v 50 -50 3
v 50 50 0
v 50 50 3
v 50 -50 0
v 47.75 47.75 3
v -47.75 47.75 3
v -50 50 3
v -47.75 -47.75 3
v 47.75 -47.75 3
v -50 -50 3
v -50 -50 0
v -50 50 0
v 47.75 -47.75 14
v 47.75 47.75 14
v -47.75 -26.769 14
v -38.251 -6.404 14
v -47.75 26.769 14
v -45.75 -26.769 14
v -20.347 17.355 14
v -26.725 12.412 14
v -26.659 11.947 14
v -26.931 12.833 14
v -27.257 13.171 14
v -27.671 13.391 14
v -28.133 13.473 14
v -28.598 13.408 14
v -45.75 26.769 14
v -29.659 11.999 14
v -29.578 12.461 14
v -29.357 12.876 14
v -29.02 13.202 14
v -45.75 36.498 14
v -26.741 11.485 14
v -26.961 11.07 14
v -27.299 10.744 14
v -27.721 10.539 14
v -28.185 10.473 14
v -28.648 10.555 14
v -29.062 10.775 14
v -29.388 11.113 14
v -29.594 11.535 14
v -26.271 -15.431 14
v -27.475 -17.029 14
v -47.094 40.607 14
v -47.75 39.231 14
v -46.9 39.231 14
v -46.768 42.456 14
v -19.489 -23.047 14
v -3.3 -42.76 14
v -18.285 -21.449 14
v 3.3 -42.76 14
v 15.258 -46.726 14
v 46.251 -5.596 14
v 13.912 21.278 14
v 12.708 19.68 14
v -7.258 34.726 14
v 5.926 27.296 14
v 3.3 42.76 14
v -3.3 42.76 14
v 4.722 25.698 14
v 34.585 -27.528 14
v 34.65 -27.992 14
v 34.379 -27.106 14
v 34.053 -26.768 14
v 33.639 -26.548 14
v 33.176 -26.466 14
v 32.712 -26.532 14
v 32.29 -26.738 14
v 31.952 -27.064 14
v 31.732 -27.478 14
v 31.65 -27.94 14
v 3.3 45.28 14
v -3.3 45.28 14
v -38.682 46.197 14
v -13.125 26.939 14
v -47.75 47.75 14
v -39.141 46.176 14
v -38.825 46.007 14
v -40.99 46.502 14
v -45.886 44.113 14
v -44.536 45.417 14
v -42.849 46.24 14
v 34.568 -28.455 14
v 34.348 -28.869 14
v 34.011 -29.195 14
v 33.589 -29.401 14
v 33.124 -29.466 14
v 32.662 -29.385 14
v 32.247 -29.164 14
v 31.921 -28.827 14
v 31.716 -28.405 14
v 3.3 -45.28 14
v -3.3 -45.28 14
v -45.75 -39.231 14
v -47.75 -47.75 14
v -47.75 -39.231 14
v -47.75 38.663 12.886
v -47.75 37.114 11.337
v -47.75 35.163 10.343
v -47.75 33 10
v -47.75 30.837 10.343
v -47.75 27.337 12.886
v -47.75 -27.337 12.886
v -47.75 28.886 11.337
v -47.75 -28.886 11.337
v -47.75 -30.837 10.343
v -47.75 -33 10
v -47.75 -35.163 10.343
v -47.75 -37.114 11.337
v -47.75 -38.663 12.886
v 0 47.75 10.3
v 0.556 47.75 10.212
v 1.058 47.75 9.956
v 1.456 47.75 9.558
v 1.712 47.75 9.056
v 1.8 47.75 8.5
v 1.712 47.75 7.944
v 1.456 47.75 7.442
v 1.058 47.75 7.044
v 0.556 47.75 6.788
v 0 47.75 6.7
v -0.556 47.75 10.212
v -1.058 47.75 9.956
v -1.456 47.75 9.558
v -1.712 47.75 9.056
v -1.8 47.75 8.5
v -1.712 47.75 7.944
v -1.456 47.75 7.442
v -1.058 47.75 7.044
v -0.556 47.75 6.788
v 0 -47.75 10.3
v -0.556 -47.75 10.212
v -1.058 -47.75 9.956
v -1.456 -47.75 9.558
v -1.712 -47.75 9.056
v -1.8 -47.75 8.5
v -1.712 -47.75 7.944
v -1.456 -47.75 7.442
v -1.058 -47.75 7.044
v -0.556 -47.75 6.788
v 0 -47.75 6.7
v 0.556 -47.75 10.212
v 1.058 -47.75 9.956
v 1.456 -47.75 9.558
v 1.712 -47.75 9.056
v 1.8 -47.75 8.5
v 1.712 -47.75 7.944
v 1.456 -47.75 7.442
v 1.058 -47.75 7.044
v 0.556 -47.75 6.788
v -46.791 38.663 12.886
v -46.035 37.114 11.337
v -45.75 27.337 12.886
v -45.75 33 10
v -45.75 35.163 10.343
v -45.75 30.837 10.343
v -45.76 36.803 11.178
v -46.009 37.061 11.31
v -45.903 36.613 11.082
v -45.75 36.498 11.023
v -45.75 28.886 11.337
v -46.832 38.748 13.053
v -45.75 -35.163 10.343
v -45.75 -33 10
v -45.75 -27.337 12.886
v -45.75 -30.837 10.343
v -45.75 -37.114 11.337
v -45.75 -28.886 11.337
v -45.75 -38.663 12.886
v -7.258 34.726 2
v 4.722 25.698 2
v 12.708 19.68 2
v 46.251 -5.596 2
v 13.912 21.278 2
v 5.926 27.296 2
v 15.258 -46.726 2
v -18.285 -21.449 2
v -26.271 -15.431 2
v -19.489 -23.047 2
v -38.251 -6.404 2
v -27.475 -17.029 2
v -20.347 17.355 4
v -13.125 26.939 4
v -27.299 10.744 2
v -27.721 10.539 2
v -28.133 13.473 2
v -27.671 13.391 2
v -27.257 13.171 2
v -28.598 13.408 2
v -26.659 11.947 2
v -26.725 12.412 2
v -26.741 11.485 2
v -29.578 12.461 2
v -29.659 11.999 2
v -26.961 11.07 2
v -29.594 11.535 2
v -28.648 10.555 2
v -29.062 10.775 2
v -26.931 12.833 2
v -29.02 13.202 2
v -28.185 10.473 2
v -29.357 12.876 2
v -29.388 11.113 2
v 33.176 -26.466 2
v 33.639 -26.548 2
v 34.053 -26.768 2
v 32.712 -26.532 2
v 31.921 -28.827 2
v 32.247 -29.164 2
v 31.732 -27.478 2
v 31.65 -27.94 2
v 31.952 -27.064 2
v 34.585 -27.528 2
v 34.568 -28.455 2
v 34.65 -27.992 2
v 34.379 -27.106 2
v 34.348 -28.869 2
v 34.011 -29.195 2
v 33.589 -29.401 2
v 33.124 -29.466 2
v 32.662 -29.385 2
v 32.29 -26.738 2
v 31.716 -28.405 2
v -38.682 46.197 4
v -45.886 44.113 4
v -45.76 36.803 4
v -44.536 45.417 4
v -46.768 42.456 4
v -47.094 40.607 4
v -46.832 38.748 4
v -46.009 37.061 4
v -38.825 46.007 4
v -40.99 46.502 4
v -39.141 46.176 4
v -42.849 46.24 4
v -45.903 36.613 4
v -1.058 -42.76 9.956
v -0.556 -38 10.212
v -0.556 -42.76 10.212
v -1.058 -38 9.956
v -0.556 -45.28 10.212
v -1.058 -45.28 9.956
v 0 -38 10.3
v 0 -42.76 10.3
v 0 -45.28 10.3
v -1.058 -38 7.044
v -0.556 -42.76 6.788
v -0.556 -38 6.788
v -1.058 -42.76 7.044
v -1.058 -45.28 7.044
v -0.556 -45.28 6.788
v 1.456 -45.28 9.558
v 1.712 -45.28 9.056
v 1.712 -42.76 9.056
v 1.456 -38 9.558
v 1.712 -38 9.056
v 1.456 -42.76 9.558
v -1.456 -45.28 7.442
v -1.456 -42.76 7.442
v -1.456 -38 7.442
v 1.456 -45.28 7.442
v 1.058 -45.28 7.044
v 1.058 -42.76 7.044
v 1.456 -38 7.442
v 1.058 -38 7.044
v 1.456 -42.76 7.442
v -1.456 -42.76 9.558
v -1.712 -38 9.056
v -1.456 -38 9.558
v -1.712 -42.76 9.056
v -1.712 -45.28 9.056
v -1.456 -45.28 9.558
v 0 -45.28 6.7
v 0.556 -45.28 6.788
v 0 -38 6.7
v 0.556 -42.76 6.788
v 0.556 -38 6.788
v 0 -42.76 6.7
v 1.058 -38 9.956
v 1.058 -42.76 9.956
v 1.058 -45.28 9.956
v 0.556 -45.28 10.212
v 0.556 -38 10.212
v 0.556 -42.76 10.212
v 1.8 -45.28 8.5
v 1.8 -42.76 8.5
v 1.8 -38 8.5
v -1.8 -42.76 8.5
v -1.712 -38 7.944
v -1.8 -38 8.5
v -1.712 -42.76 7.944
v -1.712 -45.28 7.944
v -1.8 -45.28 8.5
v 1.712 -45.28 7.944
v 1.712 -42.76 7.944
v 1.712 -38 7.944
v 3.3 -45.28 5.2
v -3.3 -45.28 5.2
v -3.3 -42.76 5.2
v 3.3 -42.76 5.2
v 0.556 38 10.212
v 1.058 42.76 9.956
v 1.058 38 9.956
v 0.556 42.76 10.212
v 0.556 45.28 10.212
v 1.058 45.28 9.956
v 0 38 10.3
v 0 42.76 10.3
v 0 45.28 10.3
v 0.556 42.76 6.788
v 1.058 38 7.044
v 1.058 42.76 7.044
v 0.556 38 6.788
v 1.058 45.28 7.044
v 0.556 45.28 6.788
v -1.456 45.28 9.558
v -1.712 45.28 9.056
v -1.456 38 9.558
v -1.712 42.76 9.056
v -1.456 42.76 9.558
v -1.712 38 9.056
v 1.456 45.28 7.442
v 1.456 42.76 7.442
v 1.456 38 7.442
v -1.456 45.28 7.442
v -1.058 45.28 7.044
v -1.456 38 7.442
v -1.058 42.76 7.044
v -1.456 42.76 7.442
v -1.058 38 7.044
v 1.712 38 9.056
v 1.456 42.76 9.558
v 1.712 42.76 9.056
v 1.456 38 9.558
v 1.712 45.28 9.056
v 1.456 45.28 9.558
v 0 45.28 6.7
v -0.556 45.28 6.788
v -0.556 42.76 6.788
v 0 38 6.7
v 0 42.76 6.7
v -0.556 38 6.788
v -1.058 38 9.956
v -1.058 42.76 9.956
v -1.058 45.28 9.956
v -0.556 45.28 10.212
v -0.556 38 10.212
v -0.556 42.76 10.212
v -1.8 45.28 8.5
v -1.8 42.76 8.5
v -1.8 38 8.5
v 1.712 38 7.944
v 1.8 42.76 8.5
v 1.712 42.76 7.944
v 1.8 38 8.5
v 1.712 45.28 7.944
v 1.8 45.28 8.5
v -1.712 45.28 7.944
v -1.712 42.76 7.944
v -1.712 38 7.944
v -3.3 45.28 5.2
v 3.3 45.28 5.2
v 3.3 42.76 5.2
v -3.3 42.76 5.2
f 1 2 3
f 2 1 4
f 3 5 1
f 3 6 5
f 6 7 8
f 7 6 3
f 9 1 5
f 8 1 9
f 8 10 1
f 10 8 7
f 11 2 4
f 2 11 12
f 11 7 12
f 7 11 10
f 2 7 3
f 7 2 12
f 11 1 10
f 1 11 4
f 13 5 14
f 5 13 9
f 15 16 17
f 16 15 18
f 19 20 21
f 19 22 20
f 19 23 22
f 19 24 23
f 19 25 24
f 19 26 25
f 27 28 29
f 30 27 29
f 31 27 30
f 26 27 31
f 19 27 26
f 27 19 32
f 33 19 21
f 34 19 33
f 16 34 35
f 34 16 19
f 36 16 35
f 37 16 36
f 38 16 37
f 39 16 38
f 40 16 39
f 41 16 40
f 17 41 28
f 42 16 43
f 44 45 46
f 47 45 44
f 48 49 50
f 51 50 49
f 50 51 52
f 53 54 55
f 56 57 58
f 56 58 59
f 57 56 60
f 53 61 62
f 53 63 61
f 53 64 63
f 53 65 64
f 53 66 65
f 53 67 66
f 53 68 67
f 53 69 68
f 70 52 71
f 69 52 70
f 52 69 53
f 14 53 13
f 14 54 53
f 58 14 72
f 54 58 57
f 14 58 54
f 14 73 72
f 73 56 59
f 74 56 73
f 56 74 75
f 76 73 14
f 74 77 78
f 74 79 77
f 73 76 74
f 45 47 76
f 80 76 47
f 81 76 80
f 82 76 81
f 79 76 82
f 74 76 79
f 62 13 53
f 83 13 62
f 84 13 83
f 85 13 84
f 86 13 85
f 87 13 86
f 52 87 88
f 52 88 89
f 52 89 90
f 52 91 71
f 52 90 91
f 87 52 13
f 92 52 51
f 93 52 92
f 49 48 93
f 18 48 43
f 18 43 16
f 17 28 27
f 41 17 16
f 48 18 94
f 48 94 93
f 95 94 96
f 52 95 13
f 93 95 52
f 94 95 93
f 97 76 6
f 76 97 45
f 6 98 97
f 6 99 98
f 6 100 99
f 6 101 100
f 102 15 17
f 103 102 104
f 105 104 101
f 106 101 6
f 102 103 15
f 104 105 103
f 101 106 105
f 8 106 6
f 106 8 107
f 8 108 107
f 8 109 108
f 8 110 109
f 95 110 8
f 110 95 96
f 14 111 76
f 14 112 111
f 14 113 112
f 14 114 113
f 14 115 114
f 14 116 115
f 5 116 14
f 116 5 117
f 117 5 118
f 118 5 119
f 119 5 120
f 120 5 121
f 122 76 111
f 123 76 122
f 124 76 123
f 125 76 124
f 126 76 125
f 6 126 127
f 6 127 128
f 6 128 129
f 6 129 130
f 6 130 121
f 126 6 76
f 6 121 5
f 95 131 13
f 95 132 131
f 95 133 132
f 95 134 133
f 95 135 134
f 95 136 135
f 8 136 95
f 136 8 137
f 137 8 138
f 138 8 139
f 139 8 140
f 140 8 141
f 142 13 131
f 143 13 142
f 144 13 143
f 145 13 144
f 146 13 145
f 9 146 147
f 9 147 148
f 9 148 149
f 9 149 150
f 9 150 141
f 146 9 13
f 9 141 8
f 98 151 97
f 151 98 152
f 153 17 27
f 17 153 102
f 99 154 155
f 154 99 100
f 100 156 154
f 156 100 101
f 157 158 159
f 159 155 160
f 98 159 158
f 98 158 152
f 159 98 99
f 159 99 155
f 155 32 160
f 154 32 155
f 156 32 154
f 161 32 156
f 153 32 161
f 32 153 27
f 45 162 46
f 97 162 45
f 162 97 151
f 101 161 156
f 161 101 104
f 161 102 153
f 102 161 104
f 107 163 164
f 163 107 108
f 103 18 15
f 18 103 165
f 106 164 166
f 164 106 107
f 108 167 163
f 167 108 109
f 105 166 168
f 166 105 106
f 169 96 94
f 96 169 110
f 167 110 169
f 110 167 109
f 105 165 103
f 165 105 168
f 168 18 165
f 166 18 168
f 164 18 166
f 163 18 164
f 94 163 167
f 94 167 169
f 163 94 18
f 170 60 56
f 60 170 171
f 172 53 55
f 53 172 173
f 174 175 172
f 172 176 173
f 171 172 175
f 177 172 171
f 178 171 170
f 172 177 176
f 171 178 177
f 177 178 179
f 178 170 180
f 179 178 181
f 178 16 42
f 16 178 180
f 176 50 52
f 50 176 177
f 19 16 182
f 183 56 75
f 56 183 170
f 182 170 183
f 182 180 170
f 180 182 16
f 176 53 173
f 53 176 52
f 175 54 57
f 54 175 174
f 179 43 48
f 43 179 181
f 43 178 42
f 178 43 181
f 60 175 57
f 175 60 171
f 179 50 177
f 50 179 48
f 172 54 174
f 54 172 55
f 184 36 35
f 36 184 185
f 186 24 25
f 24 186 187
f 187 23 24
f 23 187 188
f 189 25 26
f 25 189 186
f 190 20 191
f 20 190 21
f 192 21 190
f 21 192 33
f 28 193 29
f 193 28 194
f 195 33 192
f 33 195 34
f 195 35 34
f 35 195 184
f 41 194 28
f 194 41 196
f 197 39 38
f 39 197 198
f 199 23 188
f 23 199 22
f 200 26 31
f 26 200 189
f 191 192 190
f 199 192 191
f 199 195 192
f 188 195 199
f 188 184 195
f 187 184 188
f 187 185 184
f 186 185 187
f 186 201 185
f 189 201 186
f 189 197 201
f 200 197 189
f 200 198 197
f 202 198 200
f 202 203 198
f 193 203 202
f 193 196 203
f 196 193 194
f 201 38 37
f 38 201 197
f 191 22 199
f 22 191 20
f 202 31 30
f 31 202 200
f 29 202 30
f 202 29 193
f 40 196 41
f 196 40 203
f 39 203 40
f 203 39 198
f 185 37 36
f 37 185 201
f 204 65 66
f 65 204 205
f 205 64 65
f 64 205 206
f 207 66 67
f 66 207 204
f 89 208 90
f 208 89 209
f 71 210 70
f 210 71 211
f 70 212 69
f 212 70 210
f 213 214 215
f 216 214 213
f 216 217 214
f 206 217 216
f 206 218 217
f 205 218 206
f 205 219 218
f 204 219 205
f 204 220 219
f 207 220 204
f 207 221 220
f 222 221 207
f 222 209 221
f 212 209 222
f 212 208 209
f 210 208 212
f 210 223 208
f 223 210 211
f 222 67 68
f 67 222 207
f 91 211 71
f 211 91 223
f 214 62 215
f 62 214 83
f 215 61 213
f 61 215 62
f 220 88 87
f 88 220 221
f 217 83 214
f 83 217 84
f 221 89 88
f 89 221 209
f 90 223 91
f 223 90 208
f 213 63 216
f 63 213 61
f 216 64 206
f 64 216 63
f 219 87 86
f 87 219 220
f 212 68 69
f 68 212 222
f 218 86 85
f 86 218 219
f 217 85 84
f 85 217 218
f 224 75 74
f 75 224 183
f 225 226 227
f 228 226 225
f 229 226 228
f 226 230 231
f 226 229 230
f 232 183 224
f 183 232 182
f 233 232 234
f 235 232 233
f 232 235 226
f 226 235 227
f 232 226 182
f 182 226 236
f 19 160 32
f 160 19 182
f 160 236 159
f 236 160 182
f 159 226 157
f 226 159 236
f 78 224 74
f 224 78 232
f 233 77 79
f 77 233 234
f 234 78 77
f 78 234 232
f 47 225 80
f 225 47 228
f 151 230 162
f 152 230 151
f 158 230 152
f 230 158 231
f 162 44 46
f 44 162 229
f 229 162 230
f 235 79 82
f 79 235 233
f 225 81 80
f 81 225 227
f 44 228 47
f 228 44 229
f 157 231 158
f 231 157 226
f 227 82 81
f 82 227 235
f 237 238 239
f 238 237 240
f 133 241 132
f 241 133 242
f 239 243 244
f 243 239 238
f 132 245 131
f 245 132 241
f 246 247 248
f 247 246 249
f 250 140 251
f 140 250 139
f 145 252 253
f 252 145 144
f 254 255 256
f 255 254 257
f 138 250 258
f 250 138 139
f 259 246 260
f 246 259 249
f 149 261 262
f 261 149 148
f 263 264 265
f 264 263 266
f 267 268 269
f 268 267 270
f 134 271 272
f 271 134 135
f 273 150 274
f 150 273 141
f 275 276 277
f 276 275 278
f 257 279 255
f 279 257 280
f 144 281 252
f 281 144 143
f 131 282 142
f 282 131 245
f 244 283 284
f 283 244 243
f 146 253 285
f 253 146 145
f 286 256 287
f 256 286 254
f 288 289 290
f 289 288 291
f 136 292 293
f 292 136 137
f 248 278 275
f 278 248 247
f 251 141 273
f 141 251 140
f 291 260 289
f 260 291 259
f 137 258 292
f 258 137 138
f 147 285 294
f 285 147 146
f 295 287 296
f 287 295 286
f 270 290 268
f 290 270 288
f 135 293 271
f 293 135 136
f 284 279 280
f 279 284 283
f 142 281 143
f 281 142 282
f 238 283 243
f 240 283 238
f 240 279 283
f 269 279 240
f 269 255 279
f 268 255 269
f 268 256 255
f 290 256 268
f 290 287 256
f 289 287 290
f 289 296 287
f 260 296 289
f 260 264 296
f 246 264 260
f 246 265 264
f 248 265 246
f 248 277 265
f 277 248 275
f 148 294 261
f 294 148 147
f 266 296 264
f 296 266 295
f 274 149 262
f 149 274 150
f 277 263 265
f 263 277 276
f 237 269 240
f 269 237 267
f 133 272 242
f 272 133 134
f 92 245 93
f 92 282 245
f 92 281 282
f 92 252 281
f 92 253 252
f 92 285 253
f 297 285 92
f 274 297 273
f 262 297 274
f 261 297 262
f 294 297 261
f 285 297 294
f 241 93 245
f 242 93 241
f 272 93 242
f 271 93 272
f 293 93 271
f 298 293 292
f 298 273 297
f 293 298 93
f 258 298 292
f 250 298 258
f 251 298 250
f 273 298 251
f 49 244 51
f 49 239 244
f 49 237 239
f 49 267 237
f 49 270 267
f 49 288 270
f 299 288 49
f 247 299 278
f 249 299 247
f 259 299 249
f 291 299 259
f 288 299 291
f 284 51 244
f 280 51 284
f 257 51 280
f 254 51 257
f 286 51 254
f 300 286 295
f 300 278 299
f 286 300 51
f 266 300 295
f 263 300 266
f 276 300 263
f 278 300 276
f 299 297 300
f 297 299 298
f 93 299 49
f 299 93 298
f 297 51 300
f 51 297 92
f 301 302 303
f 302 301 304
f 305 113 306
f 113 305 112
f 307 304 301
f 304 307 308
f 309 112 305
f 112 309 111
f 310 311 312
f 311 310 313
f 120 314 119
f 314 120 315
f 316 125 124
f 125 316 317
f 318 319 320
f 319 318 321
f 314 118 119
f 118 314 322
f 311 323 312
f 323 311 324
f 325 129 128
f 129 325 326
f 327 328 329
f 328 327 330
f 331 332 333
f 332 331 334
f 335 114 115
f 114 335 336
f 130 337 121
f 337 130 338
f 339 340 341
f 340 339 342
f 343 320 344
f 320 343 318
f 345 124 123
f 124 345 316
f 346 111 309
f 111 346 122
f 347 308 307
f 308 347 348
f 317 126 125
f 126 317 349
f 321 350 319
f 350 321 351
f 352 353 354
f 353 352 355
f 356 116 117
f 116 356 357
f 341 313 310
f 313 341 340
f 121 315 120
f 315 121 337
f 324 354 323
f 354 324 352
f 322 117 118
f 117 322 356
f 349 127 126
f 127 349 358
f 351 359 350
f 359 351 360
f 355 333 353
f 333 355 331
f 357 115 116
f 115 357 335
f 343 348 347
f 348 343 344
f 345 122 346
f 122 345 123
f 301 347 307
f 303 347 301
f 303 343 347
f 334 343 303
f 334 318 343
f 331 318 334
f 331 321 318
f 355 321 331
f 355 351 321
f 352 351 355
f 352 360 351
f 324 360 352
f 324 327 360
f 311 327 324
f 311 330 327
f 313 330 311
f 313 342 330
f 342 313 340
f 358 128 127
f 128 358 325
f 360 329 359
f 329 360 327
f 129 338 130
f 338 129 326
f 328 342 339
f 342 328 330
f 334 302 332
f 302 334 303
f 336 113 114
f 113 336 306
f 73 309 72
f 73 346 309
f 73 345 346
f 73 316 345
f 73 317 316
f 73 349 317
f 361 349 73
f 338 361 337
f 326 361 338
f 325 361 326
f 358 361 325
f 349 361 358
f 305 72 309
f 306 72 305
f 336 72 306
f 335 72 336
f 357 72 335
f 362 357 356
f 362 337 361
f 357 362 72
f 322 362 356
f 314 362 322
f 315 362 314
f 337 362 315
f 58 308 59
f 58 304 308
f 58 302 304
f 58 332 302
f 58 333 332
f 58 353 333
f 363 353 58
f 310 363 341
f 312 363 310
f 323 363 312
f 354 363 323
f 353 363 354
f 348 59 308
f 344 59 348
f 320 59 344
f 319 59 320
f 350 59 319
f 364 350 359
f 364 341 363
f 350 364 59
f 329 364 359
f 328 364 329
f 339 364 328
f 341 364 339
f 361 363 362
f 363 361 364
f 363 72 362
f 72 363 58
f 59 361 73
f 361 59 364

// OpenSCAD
// file: OpenSCAD-lib/DIN_screw_nut.scad
// This library designs screw assemblies such that you place them in the designed object and substract them from your shape. Then 3D print the object, insert screws and nuts to assemble it.

// Basic DIN912 screw, HEX socket
// head diameter is a function of screw diameter head_h=d*1.5+1
// head height is the same as the diameter
// fit factor is used to scale for better fit when 3D printer, applies to diameter only
// set to 1 if you want to screw into plastic or to 1.2 if the screw should go through
module screw_din912(l=16,d=3,fit=1.2,res=20){
	translate([0,0,-l/2])
	cylinder(h=l,r=d/2*fit,center=true,$fn=res);
	//head
	translate([0,0,d/2])
	cylinder(h=d,r=(d*1.5+1)/2*fit,center=true,$fn=res);
}

module screw_din912_path(l=16,d=3,fit=1.2,path_l=100,res=20){
	translate([0,0,-l/2])
	cylinder(h=l,r=d/2*fit,center=true,$fn=res);
	//head transformed into insert path
	translate([0,0,path_l/2])
	cylinder(h=path_l,r=(d*1.5+1)/2*fit,center=true,$fn=res);
}

// Basic DIN965 screw, Philips head countersunk head 
// head diameter is a function of screw diameter  approximately by d*1.9
// head height is about 0.55 of diameter
// fit factor is used to scale for better fit when 3D printer, applies to diameter only
// set to 1 if you want to screw into plastic or to 1.2 if the screw should go through
module screw_din965(l=16,d=3,fit=1.2,res=20){
	translate([0,0,-l/2])
	cylinder(h=l,r=d/2*fit,center=true,$fn=res);
	//head
	translate([0,0,d*0.26])
	cylinder(h=d*0.6,r1=d/2*fit,r2=d*1.9/2*fit,center=true,$fn=res);
}

module screw_din965_path(l=16,d=3,fit=1.2,res=20){
	screw_din965(l,d,fit,res);
	translate([0,0,l/2+d*0.55])
	cylinder(h=l,r=d*1.9/2*fit,center=true,$fn=res);
}

// Basic DIN562 square nut, must useful for 3D prints, normal nuts start spinning
// d defined as the screw diameter
// nut width lengths is d*1.5+1
// bottom of the nut is zero z
// thickness is not proportional to screw size exactly, but d/2+0.2 works good enough
// use fit 1.2 to be able to easily insert it into the 3D printed part
module nut_din562(d=3.5,fit=1.2){
	translate([0,0,((d/2+0.2)*fit)/2])
	cube([(d*1.5+1)*fit,(d*1.5+1)*fit,(d/2+0.2)*fit], center=true);
}

// DIN562 nut with added insert path
module nut_din562_path(d=3.5,fit=1.2,path_l=30){
	translate([0,0,((d/2+0.2)*fit)/2])
	cube([(d*1.5+1)*fit,(d*1.5+1)*fit,(d/2+0.6)*fit], center=true);
	//path
	translate([path_l/2,0,((d/2+0.2)*fit)/2])
	cube([path_l,(d*1.5+1)*fit,(d/2+0.6)*fit], center=true);
}

// Basic combination of the screw and nut
// nut depth is defined as the length of the screw looking out of the nut
module screw_din912_nut_din562(l=16,d=3,nut_depth=5,fit=1.2,res=20){
	screw_din912_path(l,d,fit,res);
	translate([0,0,-l+nut_depth])
	nut_din562_path(d,fit);
}

// Most useful combination, screw + nut with insert patchs, so you can be sure that you can insert the screw and the nut into the 3D printed part
// nut depth is defined as the length of the screw looking out of the nut
module screw_din912_nut_din562(l=16,d=3,nut_depth=5,screw_path=100,nut_path=30,fit=1.2,res=20){
	screw_din912_path(l,d,fit,screw_path,res);
	translate([0,0,-l+nut_depth])
	nut_din562_path(d,fit,nut_path);
}
// main file
/* koruza-lid is part of the koruza-v5
This lid houses Tiva C Launchpad and covers the back side of the enclosure.

Copyright Institute IRNAS Rače 2014 - info@irnas.eu

This program is free software: you can redistribute it and/or modify
it under the terms of the GNU General Public License as published by
the Free Software Foundation, either version 3 of the License, or
(at your option) any later version.

This program is distributed in the hope that it will be useful,
but WITHOUT ANY WARRANTY; without even the implied warranty of
MERCHANTABILITY or FITNESS FOR A PARTICULAR PURPOSE.  See the
GNU General Public License for more details.

You should have received a copy of the GNU General Public License
along with this program.  If not, see <http://www.gnu.org/licenses/>.*/

// Include library containing elements
include <OpenSCAD-lib/DIN_screw_nut.scad>;

// Define main variables for dimensions of the lid 
lid_o_w=100; // outer width
lid_o_t=3; // thickness of the outer part
lid_i_w=95.5; // inner width
lid_i_t=11; // inner depth

// Define variables for the shape of the circuit cutout
pcb_w=51.5;
pcb_l=67;
pcb_t=14;
pcb_usb_w=12;
pcb_usb_l=32;
pcb_usb_t=10;
pcb_usb_off_c=10;

// create the lid as a module
module lid(){
	translate([0,0,lid_o_t/2])
	cube(size=[lid_o_w,lid_o_w,lid_o_t], center=true);
	translate([0,0,lid_i_t/2+lid_o_t])
	cube(size=[lid_i_w,lid_i_w,lid_i_t], center=true);
}

// create cutouts for the screws of the mount inside koruza
module screw_caps(){
	translate([-lid_i_w/2,33,17])
	rotate(a=[0,90,0])
	cylinder(h=4,r=7,center=true,$fn=20);
	translate([-lid_i_w/2,-33,17])
	rotate(a=[0,90,0])
	cylinder(h=4,r=7,center=true,$fn=20);
}

// create the PCB object
module pcb(){
	cube(size=[pcb_w,pcb_l,pcb_t], center=true);
	translate([0,pcb_l/2-20,0])
	cube(size=[pcb_w+4,10,pcb_t], center=true);
	translate([-5,pcb_l/2+3,0])
	cylinder(h=pcb_t,r=1.5,center=true,$fn=20);
	translate([0,-(pcb_l/2+3),0])
	cylinder(h=pcb_t,r=1.5,center=true,$fn=20);
	translate([pcb_usb_off_c,pcb_l/2+pcb_usb_l/2,0])
	cube(size=[pcb_usb_w,pcb_usb_l,pcb_usb_t], center=true);//USB
	translate([pcb_usb_off_c,pcb_l-3,0])
	cylinder(h=pcb_usb_t,r=pcb_usb_w/2,center=true,$fn=20);
}

// create the lid as a difference of the the main part and cutouts and screws
// for development and debugging change difference to union, blue parts are what will be cut out
difference(){
	// this is the part we are cutting things from
	lid();
	color("blue")
	// cut away space for screw caps
	screw_caps();
	// position and cut away the space for the PCB
	color("blue")
	translate([4,-6,lid_o_t+pcb_t/2-1])
	rotate(a=[0,0,53])
	color("blue")
	pcb();
	// position and cut away the holes for the screw and nuts
	// since it is symmetric, treating it as such
	color("blue")
	for(x=[0,180]){
		rotate(a=[0,0,x])
		translate([0,-lid_o_w/2,lid_o_t+5.5])
		rotate(a=[-90,-90,180])
		screw_din912_nut_din562(l=12,d=3,nut_depth=5,fit=1.2);
	}
}
